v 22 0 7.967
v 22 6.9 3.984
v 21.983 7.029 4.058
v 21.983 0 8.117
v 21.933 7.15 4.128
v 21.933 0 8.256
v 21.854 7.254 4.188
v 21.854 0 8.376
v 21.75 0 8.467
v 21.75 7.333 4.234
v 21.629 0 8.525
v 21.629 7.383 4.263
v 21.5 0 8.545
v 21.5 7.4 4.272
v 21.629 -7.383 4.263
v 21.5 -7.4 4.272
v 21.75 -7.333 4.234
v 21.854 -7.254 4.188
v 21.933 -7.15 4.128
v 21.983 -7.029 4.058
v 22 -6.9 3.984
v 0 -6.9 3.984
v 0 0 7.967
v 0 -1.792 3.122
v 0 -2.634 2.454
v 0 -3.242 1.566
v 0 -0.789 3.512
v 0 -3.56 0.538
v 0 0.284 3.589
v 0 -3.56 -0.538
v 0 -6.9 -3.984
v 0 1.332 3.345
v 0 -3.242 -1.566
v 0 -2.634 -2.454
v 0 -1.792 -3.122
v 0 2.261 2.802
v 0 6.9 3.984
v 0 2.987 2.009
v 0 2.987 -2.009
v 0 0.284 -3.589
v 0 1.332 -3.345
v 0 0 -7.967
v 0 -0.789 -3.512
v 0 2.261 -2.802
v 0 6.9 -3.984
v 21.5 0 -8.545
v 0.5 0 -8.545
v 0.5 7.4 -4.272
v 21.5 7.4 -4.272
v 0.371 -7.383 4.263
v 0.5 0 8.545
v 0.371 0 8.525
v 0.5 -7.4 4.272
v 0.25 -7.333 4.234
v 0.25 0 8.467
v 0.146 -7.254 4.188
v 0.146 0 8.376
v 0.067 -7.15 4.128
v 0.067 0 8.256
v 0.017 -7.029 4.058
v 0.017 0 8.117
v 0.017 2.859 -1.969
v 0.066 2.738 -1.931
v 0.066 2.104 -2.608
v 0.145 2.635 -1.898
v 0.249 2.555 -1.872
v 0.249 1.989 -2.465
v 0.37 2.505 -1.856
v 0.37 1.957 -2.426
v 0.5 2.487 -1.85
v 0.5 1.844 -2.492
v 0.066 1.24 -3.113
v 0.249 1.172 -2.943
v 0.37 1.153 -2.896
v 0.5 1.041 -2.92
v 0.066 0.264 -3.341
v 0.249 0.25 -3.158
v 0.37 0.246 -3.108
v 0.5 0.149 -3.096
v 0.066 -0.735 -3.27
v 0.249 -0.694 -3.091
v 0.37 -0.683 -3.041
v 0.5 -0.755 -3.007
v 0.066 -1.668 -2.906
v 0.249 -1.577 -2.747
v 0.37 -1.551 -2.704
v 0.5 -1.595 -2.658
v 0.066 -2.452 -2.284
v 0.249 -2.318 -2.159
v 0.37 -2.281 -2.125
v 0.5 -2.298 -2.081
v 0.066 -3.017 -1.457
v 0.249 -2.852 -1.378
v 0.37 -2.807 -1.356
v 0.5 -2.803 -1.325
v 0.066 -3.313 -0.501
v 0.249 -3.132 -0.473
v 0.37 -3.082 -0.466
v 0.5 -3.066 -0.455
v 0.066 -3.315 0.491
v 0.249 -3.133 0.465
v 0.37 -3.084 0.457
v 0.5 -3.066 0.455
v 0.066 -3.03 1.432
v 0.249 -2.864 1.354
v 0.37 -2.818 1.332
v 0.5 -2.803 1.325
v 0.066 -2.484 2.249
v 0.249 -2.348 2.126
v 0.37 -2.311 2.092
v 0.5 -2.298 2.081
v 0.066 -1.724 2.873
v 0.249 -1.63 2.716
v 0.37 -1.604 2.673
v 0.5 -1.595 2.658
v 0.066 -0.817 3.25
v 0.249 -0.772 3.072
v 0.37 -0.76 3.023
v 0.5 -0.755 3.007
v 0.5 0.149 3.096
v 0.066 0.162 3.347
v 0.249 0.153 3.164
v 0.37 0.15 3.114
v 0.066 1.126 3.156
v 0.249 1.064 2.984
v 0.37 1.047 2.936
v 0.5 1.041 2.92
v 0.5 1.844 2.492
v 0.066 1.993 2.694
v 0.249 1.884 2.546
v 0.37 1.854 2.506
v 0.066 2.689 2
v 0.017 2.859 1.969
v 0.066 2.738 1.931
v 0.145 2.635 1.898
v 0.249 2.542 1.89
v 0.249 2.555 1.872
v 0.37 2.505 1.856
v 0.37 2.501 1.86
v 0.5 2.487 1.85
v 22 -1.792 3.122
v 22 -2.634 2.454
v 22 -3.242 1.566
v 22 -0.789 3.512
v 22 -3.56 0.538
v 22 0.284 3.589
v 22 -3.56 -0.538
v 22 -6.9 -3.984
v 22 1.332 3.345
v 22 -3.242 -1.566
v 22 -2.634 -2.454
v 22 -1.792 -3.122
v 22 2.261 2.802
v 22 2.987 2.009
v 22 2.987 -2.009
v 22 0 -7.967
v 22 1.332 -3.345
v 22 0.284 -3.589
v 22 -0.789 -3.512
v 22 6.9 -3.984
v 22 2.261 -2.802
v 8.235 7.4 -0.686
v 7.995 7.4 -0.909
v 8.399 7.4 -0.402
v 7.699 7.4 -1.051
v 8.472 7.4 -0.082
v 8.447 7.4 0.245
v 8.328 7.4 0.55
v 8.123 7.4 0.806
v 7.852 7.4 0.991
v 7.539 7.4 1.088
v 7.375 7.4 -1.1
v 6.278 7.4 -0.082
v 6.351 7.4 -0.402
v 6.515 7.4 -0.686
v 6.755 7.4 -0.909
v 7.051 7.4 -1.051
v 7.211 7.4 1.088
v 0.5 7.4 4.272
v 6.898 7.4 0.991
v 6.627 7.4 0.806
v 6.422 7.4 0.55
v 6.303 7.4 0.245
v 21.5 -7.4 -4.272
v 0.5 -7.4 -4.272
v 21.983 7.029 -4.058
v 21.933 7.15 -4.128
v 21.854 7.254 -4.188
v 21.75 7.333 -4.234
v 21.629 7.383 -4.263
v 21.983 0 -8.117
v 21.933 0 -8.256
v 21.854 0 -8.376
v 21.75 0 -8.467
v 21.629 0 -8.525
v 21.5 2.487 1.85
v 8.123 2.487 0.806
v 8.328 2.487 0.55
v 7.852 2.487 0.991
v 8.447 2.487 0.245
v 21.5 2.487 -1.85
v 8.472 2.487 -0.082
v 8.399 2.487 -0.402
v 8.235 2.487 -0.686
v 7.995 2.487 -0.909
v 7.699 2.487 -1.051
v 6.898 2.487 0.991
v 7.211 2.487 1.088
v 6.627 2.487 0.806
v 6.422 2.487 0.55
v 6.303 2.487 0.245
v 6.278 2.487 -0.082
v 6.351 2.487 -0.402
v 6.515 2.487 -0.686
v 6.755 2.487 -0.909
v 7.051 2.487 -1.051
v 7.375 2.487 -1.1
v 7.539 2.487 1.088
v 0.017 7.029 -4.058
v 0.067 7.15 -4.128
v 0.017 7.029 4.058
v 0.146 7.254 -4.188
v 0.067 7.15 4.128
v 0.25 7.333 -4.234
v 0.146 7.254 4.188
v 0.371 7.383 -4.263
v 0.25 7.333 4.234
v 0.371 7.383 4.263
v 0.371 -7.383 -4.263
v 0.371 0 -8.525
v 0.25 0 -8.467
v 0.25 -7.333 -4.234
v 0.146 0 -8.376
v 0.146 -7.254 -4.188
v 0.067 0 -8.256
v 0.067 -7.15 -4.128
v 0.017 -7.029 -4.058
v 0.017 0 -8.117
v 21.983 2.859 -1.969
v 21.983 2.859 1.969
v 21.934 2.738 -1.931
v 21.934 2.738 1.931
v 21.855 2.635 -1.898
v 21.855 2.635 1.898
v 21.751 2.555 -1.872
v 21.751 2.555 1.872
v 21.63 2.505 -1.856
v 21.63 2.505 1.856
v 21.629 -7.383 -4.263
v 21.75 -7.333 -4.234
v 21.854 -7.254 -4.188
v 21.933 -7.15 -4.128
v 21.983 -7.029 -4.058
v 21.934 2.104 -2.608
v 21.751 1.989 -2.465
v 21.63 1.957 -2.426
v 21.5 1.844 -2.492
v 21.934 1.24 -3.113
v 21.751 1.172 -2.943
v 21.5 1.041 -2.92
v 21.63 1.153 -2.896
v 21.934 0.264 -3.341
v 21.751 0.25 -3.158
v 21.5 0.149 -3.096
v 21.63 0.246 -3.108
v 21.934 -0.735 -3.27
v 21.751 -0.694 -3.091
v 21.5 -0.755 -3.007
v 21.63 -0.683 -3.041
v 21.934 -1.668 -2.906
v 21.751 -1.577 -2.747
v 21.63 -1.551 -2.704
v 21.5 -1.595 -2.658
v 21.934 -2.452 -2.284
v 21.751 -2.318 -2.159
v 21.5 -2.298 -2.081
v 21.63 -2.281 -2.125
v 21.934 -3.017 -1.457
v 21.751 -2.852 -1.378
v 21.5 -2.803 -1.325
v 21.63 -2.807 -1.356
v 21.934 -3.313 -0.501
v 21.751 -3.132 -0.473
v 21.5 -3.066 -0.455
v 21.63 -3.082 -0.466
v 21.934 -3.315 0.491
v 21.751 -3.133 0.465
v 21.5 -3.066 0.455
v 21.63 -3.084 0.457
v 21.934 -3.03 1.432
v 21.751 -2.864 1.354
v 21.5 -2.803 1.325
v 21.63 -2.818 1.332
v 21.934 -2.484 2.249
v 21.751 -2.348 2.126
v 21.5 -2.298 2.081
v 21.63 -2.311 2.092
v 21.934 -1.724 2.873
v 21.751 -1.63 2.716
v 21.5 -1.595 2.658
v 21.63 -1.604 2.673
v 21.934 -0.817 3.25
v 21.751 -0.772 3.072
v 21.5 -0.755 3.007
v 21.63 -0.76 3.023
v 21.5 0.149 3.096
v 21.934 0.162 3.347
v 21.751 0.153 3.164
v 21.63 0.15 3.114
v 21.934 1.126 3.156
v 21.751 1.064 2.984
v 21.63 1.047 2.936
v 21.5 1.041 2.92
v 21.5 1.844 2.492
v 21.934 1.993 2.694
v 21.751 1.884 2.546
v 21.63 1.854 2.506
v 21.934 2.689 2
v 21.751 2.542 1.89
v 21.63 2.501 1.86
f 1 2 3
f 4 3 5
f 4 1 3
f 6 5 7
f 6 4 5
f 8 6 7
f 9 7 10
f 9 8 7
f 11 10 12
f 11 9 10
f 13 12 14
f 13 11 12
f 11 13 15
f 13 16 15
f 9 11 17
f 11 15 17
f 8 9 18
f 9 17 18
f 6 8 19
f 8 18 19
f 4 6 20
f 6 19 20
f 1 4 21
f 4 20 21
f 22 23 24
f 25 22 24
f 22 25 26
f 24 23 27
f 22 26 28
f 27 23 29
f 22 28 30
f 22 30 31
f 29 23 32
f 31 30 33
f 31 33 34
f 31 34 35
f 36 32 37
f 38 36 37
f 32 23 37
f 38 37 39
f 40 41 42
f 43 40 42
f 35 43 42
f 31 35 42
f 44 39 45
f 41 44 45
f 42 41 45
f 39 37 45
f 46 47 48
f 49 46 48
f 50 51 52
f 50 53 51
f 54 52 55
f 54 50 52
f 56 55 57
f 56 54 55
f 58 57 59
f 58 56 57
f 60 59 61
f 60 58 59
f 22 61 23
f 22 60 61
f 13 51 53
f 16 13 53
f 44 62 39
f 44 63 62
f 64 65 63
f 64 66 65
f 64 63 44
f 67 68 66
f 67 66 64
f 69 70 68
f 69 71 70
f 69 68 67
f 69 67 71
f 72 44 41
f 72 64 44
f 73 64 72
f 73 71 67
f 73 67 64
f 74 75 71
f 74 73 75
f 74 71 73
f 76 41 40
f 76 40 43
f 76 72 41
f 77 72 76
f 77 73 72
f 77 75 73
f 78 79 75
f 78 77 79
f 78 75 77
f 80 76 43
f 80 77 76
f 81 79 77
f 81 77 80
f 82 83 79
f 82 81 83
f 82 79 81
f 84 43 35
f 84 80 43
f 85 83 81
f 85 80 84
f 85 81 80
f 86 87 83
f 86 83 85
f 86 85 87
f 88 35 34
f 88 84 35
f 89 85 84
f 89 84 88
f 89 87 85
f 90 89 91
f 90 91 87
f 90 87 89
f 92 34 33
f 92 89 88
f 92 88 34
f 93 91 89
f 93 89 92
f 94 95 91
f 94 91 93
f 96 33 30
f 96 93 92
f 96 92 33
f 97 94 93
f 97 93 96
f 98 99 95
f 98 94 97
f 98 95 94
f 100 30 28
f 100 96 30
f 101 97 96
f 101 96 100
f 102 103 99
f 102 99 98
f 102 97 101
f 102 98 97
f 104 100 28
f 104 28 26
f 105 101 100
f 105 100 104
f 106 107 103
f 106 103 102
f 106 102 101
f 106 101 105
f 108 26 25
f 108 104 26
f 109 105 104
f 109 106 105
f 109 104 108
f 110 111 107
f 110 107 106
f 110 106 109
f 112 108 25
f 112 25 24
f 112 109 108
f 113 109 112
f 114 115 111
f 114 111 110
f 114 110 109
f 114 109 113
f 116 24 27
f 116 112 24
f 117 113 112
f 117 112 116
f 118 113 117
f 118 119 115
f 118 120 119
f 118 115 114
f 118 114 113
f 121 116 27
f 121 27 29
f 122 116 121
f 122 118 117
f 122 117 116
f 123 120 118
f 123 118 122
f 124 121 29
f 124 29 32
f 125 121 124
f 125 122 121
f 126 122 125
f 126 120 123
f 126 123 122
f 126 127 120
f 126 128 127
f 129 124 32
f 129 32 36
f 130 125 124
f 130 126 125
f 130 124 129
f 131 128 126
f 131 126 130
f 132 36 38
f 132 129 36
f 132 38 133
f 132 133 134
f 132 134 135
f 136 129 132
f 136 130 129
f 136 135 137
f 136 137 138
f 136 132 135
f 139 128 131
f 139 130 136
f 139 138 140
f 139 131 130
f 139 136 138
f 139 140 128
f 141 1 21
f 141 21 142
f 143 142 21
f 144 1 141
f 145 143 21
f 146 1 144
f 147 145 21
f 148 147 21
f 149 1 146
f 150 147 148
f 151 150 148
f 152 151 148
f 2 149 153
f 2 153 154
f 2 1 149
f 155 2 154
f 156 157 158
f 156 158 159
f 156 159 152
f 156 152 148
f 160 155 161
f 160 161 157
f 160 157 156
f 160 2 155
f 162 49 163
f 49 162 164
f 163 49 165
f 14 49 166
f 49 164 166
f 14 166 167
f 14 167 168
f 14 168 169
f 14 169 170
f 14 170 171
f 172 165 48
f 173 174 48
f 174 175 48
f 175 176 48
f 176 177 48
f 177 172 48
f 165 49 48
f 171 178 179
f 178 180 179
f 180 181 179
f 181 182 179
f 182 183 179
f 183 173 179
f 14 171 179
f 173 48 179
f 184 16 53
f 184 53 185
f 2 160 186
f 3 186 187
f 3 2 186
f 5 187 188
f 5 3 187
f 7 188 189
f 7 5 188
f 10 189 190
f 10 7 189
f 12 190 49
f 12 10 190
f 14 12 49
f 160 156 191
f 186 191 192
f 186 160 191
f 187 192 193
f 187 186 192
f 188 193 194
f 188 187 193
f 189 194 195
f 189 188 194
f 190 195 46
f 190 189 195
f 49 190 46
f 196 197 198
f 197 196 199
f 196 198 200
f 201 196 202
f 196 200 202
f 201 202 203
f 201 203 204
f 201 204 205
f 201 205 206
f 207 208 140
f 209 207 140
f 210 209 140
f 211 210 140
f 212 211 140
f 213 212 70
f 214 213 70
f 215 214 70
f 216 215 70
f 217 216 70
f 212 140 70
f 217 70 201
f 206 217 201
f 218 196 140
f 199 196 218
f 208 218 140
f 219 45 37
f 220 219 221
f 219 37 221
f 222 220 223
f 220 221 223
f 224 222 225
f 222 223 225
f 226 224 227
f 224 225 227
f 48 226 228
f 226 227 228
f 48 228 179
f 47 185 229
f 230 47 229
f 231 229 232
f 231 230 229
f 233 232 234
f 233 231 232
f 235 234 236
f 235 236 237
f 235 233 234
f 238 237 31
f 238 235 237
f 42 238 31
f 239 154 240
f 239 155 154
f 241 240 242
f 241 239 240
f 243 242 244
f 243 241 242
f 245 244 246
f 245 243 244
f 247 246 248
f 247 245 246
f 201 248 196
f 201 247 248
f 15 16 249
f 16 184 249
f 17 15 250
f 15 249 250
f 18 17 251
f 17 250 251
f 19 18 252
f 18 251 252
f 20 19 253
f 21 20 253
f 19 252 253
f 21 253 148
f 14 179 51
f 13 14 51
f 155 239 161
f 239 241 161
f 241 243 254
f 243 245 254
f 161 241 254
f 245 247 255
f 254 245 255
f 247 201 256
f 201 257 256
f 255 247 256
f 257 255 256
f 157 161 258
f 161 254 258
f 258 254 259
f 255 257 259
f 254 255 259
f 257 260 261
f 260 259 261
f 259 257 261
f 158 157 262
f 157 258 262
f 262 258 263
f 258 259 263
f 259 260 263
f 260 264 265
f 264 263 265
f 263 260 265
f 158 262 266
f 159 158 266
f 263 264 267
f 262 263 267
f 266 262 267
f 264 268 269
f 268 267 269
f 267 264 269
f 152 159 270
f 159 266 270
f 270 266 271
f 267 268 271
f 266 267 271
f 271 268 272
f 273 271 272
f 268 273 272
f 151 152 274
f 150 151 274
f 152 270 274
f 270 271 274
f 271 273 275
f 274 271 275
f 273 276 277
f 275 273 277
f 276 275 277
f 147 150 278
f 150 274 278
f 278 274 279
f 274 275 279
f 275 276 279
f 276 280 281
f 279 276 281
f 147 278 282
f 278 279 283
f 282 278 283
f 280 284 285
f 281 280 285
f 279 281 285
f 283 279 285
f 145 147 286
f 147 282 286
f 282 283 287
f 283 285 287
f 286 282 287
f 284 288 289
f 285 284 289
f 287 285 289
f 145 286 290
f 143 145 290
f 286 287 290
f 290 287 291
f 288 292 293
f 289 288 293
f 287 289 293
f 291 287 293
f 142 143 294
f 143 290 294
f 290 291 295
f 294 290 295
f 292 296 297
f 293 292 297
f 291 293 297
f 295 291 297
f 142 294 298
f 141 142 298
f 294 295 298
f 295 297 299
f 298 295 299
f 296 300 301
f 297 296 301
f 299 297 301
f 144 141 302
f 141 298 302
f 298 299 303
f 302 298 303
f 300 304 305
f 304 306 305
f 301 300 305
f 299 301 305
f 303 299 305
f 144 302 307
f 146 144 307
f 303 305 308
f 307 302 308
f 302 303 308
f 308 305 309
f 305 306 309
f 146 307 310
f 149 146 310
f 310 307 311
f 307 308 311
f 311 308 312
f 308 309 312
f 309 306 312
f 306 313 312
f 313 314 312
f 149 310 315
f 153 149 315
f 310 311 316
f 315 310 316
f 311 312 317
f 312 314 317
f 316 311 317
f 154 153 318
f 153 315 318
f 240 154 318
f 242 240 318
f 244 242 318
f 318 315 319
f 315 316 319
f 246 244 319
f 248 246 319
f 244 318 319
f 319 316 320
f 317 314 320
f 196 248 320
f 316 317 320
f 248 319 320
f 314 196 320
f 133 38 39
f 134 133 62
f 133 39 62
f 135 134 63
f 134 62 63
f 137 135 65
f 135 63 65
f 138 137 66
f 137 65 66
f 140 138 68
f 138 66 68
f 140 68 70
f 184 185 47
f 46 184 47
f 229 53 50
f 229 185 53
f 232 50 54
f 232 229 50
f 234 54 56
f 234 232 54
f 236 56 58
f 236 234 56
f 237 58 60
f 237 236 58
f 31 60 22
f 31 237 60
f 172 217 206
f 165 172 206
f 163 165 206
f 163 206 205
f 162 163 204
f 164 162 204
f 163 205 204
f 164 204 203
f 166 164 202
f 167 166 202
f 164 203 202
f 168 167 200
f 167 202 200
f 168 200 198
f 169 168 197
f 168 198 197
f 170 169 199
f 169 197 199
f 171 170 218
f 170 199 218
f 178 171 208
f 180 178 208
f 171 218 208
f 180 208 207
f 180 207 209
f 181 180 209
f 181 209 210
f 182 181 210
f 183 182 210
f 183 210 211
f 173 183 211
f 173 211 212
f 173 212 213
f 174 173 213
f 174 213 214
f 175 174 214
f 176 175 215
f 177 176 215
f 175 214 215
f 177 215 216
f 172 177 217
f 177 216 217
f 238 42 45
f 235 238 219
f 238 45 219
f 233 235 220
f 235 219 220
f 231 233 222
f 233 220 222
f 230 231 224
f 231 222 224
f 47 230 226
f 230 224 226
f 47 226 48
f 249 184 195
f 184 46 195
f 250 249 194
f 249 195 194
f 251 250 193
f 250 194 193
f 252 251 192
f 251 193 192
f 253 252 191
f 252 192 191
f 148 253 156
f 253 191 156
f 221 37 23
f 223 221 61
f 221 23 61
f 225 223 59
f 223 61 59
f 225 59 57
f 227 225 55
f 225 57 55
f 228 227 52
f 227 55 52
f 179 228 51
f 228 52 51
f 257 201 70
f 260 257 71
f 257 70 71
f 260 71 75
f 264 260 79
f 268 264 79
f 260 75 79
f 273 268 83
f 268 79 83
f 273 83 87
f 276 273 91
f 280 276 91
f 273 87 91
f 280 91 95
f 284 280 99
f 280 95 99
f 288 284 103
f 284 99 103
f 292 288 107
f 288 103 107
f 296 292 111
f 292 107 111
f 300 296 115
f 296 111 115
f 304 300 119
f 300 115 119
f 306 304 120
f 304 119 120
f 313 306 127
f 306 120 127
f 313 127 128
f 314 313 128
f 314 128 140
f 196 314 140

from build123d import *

# Parameters (mm, degrees)
SALIENTE_EXTRUIR1_DEPTH      = 12
SALIENTE_EXTRUIR2_DEPTH      = 10
SALIENTE_EXTRUIR2_DEPTH_BACK = 12
CROQUIS3_R                   = 1.1
CORTAR_EXTRUIR1_DEPTH        = 4.912531407
REDONDEO1_R                  = 0.5


with BuildPart() as part:
    # Croquis1 → Saliente-Extruir1 (new body)
    with BuildSketch(Plane(origin=(0, 0, 0), x_dir=(0, 0, -1), z_dir=(1, 0, 0))):
        with BuildLine():
            Line((-2.1, 3.987468593), (2.1, 3.987468593))
            ThreePointArc((2.1, 3.987468593), (0, -4.506651282), (-2.1, 3.987468593))
        make_face()
        with BuildLine():
            Line((-1.85, 2.487468593), (1.85, 2.487468593))
            ThreePointArc((1.85, 2.487468593), (0, -3.1), (-1.85, 2.487468593))
        make_face(mode=Mode.SUBTRACT)
    extrude(amount=SALIENTE_EXTRUIR1_DEPTH)

    # Croquis2 → Saliente-Extruir2 (add, two sides: drawn at the far end of the back side and taken through both)
    with BuildSketch(Plane(origin=(12, 0, 0), x_dir=(0, 0, -1), z_dir=(1, 0, 0)).offset(-SALIENTE_EXTRUIR2_DEPTH_BACK)):
        Polygon((-4.272391992, -7.4), (4.272391992, -7.4), (8.544783984, 0), (4.272391992, 7.4), (-4.272391992, 7.4), (-8.544783984, 0), align=None)
        with BuildLine():
            Line((-1.85, 2.487468593), (1.85, 2.487468593))
            ThreePointArc((1.85, 2.487468593), (0, -3.1), (-1.85, 2.487468593))
        make_face(mode=Mode.SUBTRACT)
    extrude(amount=SALIENTE_EXTRUIR2_DEPTH + SALIENTE_EXTRUIR2_DEPTH_BACK)

    # Croquis3 → Cortar-Extruir1 (cut)
    with BuildSketch(Plane.XZ.offset(-2.487468593)):
        with Locations(Location((7.375, 0, 0), (0, 0, 270))):
            Circle(CROQUIS3_R)
    extrude(amount=-CORTAR_EXTRUIR1_DEPTH, mode=Mode.SUBTRACT)

    # Redondeo1
    redondeo1_edges = [part.edges().sort_by_distance(p)[0] for p in [
        (0, 2.487468593, 0),
        (22, -3.7, 6.408587988),
        (22, -7.4, 0),
        (22, -3.7, -6.408587988),
        (22, 3.7, -6.408587988),
        (22, 7.4, 0),
        (22, 3.7, 6.408587988),
        (0, -3.7, 6.408587988),
        (0, -7.4, 0),
        (0, -3.7, -6.408587988),
        (0, 3.7, -6.408587988),
        (0, 7.4, 0),
        (0, 3.7, 6.408587988),
        (22, -3.1, 0),
        (22, 2.487468593, 0),
        (0, -3.1, 0),
    ]]
    fillet(redondeo1_edges, radius=REDONDEO1_R)


solid = part.part
